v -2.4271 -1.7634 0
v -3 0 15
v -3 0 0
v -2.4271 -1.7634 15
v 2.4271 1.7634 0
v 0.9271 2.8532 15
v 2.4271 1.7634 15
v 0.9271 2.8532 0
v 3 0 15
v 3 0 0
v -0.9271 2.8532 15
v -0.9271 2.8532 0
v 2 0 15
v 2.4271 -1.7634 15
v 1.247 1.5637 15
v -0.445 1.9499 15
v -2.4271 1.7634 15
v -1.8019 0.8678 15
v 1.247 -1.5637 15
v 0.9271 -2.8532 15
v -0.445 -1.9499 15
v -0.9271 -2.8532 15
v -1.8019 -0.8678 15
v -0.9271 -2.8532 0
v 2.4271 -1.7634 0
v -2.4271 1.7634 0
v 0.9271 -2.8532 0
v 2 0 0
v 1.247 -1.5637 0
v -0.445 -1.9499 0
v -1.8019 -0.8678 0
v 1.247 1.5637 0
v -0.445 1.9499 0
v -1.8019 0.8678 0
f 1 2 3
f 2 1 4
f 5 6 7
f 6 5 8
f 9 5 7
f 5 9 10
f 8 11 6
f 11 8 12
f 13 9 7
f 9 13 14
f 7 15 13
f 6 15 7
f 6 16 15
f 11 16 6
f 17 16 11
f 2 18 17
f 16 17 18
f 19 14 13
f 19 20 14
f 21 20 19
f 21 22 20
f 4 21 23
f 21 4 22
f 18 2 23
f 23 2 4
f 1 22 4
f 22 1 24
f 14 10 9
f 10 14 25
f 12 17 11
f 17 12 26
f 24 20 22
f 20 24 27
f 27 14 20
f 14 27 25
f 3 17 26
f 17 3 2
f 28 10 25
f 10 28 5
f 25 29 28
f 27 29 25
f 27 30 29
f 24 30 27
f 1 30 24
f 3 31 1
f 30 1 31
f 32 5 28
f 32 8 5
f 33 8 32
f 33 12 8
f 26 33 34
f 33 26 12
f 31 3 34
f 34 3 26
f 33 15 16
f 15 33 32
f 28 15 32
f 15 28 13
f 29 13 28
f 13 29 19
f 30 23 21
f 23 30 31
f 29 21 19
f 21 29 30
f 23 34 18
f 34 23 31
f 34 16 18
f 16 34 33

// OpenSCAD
// Parameters
tubing_type = 0; //[0:10:1]
length = 15; //[8:30:1]
forced_id = 0; //[0:20:1]
center = 1; //[0:1:1]
od = 6; //[3:12:0.5]
id = 4; //[1.5:10:0.5]
eps_overlap = 0.8; //[0.5:2:0.1]
path_len = 0; //[0:1:1]

// Tubing - complete geometry
module tubing() {
  color([0.85, 0.85, 0.8]) { // Off-white for PTFE
    difference() {
      // Outer cylinder
      cylinder(h=length, r=od/2, center=center);
      // Inner cylinder
      translate([0, 0, -eps_overlap])
        cylinder(h=length + 2*eps_overlap, r=id/2, center=center);
    }
  }
}

// Assembly
module assembly() {
  tubing();
}

assembly();
